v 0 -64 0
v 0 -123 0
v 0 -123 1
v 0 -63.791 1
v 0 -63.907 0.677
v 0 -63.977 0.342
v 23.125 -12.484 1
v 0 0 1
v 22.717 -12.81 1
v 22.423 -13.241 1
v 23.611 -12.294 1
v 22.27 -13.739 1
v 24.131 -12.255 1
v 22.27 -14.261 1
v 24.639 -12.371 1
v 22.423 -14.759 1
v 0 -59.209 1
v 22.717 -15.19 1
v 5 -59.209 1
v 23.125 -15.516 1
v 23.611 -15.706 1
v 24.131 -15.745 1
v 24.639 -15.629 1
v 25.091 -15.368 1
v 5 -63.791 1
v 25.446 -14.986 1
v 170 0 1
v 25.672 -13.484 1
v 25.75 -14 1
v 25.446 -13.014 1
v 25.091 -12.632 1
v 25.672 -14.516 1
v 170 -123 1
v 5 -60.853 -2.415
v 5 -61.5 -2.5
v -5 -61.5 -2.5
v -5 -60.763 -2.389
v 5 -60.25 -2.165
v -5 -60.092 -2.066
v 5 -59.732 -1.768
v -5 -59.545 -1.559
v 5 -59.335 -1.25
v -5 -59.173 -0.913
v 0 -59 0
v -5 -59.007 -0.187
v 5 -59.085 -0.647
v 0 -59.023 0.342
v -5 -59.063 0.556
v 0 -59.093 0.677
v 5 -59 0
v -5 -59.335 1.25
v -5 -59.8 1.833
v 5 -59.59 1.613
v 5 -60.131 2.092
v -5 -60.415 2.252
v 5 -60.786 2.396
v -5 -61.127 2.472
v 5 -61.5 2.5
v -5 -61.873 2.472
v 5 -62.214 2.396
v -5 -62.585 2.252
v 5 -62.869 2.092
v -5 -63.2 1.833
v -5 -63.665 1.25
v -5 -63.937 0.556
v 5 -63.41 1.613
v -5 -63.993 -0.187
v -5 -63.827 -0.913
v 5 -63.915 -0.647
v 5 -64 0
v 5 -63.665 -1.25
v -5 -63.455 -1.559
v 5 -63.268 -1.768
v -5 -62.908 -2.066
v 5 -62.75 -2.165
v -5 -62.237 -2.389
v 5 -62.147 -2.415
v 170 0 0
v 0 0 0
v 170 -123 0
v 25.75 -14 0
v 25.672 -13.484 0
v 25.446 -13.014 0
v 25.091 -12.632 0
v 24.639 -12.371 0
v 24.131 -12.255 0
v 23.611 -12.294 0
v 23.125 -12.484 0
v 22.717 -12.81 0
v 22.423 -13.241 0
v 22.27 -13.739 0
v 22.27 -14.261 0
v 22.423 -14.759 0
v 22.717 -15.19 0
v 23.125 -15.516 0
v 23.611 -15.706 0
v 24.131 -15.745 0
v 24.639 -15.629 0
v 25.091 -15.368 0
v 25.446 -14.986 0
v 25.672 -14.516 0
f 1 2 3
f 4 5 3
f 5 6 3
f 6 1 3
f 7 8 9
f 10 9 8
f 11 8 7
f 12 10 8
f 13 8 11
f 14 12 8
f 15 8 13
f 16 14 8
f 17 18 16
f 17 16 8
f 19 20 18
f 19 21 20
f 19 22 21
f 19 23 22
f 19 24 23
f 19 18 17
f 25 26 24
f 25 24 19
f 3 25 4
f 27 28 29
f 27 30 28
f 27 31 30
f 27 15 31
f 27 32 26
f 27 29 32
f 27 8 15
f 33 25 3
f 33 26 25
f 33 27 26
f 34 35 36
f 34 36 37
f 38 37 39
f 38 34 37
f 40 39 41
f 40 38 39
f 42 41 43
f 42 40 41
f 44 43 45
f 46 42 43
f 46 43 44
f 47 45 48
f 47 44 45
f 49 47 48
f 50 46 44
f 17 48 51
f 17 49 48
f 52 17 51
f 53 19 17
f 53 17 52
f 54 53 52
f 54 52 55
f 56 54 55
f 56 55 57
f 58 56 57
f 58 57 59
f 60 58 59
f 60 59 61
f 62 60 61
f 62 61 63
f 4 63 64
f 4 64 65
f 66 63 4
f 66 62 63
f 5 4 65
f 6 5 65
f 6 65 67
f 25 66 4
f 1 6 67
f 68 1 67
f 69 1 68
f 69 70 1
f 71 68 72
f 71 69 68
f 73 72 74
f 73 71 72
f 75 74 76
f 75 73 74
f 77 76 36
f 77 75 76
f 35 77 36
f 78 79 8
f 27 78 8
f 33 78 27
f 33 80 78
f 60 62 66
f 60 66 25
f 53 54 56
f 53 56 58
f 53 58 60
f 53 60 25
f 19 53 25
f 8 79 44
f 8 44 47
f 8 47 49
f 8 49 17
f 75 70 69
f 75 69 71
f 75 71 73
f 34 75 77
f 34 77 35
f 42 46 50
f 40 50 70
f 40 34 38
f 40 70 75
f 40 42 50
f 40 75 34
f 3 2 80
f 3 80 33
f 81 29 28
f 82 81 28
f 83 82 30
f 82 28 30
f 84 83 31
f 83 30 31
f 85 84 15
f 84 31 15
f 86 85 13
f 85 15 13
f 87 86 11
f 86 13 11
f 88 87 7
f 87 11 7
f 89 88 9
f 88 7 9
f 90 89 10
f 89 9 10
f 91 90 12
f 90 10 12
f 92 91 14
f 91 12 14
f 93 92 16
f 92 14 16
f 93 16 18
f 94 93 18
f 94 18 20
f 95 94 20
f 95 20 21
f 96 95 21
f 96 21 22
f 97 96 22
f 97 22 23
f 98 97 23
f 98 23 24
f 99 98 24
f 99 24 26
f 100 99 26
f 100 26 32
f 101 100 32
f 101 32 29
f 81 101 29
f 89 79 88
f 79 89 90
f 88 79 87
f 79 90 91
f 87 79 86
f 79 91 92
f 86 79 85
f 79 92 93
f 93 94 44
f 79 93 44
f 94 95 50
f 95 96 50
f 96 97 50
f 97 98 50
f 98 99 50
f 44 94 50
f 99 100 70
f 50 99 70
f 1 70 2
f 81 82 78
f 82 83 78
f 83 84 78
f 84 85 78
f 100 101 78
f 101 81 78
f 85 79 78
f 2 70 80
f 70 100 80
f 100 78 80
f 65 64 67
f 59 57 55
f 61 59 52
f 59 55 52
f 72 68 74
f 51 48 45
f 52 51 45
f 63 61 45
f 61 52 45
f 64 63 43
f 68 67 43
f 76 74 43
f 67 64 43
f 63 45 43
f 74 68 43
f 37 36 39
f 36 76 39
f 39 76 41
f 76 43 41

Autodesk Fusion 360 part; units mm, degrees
box "BoxPrimitive1" add length 123 width 170 height 1 placed x (0, -1, 0) y (1, 0, 0) z (0, 0, 1) at (0, 0, 0) makes body 1
cylinder "CylinderPrimitive1" add diameter 5 height 10 placed x (0, 0, -1) y (0, 1, 0) z (1, 0, 0) at (0, 10, 10) separate body makes body 2
move_body "Move1" bodies 2 to x (1, 0, 0) y (0, 1, 0) z (0, 0, 1) at (0, -10, -10)
move_body "Move2" bodies 2 to x (1, 0, 0) y (0, 1, 0) z (0, 0, 1) at (0, -61.5, 0)
move_body "Move3" bodies 2 to x (1, 0, 0) y (0, 1, 0) z (0, 0, 1) at (-5, 0, 0)
combine "Combine1" operation add target body 1 tool bodies 2
cylinder "CylinderPrimitive2" cut diameter 3.5 height -1 placed x (1, 0, 0) y (0, 1, 0) z (0, 0, 1) at (24, -14, 1) bodies 1
